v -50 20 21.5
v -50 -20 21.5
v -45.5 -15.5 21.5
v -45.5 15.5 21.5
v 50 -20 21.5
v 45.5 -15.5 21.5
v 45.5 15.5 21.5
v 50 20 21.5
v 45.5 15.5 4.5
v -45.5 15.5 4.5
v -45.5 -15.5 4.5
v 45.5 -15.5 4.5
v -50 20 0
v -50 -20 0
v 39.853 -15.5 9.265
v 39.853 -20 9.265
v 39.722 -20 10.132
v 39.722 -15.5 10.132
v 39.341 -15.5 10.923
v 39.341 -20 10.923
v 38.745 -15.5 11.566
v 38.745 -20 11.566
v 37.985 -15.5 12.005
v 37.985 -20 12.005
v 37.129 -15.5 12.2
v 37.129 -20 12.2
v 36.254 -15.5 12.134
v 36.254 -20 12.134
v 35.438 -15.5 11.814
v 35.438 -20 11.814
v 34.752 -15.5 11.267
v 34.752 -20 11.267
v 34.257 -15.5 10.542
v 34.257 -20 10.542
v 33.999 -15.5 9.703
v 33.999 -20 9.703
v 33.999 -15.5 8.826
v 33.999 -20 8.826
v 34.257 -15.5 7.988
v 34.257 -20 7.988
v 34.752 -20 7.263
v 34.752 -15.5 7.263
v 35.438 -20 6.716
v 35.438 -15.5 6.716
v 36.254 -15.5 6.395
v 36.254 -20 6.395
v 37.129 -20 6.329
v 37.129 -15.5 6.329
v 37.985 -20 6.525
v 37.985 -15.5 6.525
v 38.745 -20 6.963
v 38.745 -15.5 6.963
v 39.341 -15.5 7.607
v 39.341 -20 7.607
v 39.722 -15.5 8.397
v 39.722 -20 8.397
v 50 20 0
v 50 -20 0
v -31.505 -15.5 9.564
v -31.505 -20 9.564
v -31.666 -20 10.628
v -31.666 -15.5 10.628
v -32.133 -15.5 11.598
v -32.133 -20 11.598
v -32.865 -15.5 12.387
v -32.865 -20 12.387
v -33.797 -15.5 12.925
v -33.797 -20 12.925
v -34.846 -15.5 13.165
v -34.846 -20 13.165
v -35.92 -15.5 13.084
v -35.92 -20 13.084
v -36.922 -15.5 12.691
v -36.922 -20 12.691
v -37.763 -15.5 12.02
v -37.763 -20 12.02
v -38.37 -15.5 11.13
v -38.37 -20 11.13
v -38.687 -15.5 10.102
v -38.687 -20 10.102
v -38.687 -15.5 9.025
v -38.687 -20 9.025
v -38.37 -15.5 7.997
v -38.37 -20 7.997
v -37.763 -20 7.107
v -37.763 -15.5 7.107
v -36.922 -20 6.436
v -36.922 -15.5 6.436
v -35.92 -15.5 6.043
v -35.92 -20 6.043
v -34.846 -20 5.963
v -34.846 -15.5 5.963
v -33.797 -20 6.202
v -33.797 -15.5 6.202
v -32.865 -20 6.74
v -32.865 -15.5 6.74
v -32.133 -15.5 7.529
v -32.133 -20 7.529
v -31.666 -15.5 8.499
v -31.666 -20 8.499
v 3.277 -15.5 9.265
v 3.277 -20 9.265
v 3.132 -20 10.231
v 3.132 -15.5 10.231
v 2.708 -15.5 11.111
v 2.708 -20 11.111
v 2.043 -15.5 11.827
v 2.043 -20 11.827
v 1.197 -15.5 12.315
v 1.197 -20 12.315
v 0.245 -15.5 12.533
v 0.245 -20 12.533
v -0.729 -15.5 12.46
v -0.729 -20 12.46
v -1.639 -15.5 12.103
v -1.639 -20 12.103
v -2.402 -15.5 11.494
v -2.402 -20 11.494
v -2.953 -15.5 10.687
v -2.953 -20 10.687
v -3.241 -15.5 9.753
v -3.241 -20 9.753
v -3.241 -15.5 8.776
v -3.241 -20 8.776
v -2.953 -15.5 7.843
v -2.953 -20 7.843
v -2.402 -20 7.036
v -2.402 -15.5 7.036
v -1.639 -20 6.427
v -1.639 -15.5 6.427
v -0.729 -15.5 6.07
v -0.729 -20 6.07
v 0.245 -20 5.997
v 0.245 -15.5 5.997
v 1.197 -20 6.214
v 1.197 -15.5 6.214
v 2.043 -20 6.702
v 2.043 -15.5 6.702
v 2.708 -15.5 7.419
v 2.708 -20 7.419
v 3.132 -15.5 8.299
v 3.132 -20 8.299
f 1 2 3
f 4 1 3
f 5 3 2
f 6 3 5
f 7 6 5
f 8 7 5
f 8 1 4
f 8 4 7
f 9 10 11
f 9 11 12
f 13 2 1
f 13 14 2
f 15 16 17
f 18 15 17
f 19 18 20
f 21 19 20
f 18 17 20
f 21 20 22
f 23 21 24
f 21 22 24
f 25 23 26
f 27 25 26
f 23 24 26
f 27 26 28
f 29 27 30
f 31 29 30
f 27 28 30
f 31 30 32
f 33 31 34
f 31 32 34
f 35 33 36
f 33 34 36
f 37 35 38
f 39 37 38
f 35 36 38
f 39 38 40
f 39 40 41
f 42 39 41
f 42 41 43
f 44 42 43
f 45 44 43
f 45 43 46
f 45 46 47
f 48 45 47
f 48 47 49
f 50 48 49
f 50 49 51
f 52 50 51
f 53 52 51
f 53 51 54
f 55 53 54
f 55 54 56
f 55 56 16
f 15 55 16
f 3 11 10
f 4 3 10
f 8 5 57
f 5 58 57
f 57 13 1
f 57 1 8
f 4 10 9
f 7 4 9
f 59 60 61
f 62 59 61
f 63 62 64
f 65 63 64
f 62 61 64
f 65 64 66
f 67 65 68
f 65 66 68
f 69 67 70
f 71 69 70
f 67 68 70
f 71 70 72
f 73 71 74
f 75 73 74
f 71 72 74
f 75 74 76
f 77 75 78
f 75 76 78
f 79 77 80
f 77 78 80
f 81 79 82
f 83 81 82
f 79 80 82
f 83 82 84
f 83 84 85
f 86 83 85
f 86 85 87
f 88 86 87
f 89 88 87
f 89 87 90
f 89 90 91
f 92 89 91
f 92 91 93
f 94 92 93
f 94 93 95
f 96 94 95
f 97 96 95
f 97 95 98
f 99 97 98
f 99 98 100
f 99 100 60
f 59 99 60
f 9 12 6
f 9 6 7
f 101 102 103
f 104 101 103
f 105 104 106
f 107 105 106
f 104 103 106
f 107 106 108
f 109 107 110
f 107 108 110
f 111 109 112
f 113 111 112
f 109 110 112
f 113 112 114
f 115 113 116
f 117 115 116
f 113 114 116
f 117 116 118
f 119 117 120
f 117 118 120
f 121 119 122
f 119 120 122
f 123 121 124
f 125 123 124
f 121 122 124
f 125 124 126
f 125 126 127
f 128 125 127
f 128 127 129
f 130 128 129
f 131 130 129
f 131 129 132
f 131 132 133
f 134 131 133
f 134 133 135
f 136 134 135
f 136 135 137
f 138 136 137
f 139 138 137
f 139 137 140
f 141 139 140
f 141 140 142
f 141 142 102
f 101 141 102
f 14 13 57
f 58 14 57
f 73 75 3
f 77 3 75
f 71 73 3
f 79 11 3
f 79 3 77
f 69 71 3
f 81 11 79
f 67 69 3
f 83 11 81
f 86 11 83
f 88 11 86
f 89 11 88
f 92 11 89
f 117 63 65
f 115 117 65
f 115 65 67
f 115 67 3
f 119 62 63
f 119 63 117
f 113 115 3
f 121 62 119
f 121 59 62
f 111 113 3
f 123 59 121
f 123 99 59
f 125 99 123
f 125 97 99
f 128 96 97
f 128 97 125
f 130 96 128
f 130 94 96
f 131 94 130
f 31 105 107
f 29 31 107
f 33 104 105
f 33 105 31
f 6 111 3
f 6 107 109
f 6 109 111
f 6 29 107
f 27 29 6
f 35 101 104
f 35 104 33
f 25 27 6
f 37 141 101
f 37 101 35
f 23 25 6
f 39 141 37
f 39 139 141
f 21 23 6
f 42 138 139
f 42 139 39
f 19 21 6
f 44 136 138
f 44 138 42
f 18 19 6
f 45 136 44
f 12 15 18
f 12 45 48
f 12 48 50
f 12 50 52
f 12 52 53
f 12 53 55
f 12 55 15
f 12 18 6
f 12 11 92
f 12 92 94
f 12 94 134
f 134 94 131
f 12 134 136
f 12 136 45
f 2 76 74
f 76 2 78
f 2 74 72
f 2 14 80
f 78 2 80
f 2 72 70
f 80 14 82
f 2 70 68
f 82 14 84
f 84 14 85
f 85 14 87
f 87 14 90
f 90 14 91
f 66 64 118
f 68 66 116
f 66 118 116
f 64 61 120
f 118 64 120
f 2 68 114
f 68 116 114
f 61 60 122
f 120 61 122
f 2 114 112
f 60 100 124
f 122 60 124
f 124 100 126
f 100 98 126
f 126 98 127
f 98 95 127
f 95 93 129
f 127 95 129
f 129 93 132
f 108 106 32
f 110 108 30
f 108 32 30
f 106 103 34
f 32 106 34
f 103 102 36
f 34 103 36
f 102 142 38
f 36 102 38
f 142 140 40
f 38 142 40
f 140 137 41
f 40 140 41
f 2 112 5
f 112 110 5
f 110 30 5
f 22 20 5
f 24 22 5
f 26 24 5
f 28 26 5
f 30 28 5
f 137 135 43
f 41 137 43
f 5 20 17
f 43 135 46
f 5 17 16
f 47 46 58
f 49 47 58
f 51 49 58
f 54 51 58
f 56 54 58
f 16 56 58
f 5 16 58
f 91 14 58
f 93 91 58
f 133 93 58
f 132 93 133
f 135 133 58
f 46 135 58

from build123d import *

# Parameters (mm, degrees)
F0_W     = 100
F0_H     = 40
F1_DEPTH = 4.5
F2_W     = 100
F2_H     = 40
F2_W_2   = 91
F2_H_2   = 31
F3_DEPTH = 17
F4_R     = 3.277271
F4_R_2   = 2.943444
F4_R_3   = 3.611157
F5_DEPTH = 25


with BuildPart() as f1:
    # F0 (on Top) → F1 (new body)
    with BuildSketch(Plane.XY):
        Rectangle(F0_W, F0_H)
    extrude(amount=F1_DEPTH)

    # F2 (on face) → F3 (join)
    with BuildSketch(Plane.XY.offset(4.5)):
        Rectangle(F2_W, F2_H)
        Rectangle(F2_W_2, F2_H_2, mode=Mode.SUBTRACT)
    extrude(amount=F3_DEPTH)

    # F4 (on face) → F5 (cut)
    with BuildSketch(Plane.XZ.offset(20)):
        with Locations((0, 9.264707)):
            Circle(F4_R)
        with Locations((36.909394, 9.264707)):
            Circle(F4_R_2)
        with Locations((-35.116225, 9.563568)):
            Circle(F4_R_3)
    extrude(amount=-F5_DEPTH, mode=Mode.SUBTRACT)


solid = f1.part
